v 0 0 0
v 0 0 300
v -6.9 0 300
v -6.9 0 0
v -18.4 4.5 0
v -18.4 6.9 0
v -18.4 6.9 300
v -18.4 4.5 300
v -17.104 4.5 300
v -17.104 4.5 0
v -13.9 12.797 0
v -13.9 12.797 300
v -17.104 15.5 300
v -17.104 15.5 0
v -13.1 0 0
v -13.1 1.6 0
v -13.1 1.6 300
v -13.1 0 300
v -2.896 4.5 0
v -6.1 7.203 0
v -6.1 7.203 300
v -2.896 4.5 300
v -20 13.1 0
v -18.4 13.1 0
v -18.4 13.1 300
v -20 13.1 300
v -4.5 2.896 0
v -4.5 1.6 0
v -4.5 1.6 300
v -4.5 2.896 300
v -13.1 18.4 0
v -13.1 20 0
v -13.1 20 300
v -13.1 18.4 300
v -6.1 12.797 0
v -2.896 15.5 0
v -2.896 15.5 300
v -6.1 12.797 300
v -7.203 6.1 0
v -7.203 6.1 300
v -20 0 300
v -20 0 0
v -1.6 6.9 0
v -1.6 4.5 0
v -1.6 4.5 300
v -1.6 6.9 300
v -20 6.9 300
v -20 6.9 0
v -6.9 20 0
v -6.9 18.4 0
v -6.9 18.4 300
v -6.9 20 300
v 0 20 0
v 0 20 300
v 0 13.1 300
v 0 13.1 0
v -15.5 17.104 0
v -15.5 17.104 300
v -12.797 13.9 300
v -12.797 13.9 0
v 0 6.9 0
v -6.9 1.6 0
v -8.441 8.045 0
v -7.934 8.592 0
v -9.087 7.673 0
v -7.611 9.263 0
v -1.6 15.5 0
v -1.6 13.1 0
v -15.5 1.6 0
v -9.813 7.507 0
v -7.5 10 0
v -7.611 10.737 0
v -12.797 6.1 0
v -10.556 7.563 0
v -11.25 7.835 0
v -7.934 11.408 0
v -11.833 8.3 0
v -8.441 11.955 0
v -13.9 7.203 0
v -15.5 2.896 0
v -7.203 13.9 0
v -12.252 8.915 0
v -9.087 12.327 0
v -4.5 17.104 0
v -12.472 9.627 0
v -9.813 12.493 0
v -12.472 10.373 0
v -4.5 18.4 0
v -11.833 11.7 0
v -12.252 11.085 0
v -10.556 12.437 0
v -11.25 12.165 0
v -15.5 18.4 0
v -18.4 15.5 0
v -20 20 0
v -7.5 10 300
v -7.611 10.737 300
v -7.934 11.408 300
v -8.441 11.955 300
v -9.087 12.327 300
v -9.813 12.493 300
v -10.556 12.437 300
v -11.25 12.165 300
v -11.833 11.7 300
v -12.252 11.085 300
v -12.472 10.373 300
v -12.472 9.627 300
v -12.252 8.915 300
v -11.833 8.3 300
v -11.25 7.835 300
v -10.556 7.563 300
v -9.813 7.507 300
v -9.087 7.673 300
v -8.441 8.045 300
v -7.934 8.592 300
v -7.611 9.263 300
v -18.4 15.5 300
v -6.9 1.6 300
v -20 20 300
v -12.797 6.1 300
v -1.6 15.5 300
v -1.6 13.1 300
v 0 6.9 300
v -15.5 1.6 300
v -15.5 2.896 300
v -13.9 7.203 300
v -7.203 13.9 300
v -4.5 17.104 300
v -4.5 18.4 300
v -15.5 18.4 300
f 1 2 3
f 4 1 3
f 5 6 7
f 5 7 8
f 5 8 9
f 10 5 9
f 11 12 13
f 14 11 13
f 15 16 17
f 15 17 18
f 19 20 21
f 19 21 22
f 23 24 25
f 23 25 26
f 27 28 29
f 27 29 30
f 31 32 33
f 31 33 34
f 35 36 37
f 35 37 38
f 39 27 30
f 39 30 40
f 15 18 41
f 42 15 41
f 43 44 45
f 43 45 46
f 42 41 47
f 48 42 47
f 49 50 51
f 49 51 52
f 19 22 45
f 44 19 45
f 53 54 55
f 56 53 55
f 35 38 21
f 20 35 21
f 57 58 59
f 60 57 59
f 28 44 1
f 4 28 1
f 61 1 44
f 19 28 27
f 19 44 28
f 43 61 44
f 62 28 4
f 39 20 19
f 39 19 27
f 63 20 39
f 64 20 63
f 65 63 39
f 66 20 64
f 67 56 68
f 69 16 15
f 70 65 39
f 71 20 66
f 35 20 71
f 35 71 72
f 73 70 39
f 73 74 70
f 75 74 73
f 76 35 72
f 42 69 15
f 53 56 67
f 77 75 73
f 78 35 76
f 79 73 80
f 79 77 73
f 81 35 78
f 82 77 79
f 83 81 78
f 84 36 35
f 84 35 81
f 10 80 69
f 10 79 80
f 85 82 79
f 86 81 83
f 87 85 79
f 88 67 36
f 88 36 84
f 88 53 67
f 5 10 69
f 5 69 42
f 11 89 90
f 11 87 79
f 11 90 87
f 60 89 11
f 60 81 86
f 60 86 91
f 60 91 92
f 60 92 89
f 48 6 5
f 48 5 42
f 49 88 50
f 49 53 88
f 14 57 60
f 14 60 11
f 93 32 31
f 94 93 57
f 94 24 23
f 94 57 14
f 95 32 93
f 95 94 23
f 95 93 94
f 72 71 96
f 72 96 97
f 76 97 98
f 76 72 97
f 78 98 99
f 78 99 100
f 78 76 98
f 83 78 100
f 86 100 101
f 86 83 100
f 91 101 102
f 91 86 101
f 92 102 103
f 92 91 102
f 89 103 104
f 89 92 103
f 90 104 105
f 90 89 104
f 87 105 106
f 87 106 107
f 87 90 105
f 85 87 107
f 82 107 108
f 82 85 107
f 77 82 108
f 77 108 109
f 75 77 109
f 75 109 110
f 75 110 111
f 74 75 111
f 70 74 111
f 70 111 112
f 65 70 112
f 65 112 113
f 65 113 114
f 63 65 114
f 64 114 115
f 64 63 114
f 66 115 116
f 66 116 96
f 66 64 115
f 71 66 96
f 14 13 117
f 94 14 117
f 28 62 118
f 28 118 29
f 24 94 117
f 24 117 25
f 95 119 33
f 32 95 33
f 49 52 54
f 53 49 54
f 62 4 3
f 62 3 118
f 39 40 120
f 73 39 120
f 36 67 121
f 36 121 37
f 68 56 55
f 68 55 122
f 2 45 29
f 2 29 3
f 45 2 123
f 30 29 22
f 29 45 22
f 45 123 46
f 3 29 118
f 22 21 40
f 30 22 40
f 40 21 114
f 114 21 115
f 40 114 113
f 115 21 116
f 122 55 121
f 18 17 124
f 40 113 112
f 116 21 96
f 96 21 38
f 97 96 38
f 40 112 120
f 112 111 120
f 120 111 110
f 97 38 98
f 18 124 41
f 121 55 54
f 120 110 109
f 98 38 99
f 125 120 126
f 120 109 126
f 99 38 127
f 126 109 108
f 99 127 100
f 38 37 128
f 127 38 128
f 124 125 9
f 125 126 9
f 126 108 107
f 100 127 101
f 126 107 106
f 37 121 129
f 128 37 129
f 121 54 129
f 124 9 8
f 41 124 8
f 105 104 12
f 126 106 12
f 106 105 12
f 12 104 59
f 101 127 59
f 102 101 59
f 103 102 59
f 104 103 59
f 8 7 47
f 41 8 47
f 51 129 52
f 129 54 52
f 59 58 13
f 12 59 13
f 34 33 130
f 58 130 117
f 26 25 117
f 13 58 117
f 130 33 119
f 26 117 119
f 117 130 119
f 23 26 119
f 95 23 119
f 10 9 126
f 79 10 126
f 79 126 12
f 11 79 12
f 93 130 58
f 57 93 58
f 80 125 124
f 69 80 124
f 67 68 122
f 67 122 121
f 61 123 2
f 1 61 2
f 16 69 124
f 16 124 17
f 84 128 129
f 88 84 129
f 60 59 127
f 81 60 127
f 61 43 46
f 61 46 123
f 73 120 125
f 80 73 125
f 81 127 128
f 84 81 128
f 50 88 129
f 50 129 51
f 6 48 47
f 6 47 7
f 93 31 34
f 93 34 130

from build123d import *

# Parameters (mm, degrees)
SKETCH_1_R      = 2.5
EXTRUDE_1_DEPTH = 300


with BuildPart() as part:
    # 草图1 → 凸台-拉伸1 (new body)
    with BuildSketch(Plane.XY):
        Polygon((-20, 20), (-13.1, 20), (-13.1, 18.4), (-15.5, 18.4), (-15.5, 17.104298633), (-12.797022805, 13.9), (-7.202977195, 13.9), (-4.5, 17.104298633), (-4.5, 18.4), (-6.9, 18.4), (-6.9, 20), (0, 20), (0, 13.1), (-1.6, 13.1), (-1.6, 15.5), (-2.895701367, 15.5), (-6.1, 12.797022805), (-6.1, 7.202977195), (-2.895701367, 4.5), (-1.6, 4.5), (-1.6, 6.9), (0, 6.9), (0, 0), (-6.9, 0), (-6.9, 1.6), (-4.5, 1.6), (-4.5, 2.895701367), (-7.202977195, 6.1), (-12.797022805, 6.1), (-15.5, 2.895701367), (-15.5, 1.6), (-13.1, 1.6), (-13.1, 0), (-20, 0), (-20, 6.9), (-18.4, 6.9), (-18.4, 4.5), (-17.104298633, 4.5), (-13.9, 7.202977195), (-13.9, 12.797022805), (-17.104298633, 15.5), (-18.4, 15.5), (-18.4, 13.1), (-20, 13.1), align=None)
        with Locations((-10, 10)):
            Circle(SKETCH_1_R, mode=Mode.SUBTRACT)
    extrude(amount=EXTRUDE_1_DEPTH)


solid = part.part
